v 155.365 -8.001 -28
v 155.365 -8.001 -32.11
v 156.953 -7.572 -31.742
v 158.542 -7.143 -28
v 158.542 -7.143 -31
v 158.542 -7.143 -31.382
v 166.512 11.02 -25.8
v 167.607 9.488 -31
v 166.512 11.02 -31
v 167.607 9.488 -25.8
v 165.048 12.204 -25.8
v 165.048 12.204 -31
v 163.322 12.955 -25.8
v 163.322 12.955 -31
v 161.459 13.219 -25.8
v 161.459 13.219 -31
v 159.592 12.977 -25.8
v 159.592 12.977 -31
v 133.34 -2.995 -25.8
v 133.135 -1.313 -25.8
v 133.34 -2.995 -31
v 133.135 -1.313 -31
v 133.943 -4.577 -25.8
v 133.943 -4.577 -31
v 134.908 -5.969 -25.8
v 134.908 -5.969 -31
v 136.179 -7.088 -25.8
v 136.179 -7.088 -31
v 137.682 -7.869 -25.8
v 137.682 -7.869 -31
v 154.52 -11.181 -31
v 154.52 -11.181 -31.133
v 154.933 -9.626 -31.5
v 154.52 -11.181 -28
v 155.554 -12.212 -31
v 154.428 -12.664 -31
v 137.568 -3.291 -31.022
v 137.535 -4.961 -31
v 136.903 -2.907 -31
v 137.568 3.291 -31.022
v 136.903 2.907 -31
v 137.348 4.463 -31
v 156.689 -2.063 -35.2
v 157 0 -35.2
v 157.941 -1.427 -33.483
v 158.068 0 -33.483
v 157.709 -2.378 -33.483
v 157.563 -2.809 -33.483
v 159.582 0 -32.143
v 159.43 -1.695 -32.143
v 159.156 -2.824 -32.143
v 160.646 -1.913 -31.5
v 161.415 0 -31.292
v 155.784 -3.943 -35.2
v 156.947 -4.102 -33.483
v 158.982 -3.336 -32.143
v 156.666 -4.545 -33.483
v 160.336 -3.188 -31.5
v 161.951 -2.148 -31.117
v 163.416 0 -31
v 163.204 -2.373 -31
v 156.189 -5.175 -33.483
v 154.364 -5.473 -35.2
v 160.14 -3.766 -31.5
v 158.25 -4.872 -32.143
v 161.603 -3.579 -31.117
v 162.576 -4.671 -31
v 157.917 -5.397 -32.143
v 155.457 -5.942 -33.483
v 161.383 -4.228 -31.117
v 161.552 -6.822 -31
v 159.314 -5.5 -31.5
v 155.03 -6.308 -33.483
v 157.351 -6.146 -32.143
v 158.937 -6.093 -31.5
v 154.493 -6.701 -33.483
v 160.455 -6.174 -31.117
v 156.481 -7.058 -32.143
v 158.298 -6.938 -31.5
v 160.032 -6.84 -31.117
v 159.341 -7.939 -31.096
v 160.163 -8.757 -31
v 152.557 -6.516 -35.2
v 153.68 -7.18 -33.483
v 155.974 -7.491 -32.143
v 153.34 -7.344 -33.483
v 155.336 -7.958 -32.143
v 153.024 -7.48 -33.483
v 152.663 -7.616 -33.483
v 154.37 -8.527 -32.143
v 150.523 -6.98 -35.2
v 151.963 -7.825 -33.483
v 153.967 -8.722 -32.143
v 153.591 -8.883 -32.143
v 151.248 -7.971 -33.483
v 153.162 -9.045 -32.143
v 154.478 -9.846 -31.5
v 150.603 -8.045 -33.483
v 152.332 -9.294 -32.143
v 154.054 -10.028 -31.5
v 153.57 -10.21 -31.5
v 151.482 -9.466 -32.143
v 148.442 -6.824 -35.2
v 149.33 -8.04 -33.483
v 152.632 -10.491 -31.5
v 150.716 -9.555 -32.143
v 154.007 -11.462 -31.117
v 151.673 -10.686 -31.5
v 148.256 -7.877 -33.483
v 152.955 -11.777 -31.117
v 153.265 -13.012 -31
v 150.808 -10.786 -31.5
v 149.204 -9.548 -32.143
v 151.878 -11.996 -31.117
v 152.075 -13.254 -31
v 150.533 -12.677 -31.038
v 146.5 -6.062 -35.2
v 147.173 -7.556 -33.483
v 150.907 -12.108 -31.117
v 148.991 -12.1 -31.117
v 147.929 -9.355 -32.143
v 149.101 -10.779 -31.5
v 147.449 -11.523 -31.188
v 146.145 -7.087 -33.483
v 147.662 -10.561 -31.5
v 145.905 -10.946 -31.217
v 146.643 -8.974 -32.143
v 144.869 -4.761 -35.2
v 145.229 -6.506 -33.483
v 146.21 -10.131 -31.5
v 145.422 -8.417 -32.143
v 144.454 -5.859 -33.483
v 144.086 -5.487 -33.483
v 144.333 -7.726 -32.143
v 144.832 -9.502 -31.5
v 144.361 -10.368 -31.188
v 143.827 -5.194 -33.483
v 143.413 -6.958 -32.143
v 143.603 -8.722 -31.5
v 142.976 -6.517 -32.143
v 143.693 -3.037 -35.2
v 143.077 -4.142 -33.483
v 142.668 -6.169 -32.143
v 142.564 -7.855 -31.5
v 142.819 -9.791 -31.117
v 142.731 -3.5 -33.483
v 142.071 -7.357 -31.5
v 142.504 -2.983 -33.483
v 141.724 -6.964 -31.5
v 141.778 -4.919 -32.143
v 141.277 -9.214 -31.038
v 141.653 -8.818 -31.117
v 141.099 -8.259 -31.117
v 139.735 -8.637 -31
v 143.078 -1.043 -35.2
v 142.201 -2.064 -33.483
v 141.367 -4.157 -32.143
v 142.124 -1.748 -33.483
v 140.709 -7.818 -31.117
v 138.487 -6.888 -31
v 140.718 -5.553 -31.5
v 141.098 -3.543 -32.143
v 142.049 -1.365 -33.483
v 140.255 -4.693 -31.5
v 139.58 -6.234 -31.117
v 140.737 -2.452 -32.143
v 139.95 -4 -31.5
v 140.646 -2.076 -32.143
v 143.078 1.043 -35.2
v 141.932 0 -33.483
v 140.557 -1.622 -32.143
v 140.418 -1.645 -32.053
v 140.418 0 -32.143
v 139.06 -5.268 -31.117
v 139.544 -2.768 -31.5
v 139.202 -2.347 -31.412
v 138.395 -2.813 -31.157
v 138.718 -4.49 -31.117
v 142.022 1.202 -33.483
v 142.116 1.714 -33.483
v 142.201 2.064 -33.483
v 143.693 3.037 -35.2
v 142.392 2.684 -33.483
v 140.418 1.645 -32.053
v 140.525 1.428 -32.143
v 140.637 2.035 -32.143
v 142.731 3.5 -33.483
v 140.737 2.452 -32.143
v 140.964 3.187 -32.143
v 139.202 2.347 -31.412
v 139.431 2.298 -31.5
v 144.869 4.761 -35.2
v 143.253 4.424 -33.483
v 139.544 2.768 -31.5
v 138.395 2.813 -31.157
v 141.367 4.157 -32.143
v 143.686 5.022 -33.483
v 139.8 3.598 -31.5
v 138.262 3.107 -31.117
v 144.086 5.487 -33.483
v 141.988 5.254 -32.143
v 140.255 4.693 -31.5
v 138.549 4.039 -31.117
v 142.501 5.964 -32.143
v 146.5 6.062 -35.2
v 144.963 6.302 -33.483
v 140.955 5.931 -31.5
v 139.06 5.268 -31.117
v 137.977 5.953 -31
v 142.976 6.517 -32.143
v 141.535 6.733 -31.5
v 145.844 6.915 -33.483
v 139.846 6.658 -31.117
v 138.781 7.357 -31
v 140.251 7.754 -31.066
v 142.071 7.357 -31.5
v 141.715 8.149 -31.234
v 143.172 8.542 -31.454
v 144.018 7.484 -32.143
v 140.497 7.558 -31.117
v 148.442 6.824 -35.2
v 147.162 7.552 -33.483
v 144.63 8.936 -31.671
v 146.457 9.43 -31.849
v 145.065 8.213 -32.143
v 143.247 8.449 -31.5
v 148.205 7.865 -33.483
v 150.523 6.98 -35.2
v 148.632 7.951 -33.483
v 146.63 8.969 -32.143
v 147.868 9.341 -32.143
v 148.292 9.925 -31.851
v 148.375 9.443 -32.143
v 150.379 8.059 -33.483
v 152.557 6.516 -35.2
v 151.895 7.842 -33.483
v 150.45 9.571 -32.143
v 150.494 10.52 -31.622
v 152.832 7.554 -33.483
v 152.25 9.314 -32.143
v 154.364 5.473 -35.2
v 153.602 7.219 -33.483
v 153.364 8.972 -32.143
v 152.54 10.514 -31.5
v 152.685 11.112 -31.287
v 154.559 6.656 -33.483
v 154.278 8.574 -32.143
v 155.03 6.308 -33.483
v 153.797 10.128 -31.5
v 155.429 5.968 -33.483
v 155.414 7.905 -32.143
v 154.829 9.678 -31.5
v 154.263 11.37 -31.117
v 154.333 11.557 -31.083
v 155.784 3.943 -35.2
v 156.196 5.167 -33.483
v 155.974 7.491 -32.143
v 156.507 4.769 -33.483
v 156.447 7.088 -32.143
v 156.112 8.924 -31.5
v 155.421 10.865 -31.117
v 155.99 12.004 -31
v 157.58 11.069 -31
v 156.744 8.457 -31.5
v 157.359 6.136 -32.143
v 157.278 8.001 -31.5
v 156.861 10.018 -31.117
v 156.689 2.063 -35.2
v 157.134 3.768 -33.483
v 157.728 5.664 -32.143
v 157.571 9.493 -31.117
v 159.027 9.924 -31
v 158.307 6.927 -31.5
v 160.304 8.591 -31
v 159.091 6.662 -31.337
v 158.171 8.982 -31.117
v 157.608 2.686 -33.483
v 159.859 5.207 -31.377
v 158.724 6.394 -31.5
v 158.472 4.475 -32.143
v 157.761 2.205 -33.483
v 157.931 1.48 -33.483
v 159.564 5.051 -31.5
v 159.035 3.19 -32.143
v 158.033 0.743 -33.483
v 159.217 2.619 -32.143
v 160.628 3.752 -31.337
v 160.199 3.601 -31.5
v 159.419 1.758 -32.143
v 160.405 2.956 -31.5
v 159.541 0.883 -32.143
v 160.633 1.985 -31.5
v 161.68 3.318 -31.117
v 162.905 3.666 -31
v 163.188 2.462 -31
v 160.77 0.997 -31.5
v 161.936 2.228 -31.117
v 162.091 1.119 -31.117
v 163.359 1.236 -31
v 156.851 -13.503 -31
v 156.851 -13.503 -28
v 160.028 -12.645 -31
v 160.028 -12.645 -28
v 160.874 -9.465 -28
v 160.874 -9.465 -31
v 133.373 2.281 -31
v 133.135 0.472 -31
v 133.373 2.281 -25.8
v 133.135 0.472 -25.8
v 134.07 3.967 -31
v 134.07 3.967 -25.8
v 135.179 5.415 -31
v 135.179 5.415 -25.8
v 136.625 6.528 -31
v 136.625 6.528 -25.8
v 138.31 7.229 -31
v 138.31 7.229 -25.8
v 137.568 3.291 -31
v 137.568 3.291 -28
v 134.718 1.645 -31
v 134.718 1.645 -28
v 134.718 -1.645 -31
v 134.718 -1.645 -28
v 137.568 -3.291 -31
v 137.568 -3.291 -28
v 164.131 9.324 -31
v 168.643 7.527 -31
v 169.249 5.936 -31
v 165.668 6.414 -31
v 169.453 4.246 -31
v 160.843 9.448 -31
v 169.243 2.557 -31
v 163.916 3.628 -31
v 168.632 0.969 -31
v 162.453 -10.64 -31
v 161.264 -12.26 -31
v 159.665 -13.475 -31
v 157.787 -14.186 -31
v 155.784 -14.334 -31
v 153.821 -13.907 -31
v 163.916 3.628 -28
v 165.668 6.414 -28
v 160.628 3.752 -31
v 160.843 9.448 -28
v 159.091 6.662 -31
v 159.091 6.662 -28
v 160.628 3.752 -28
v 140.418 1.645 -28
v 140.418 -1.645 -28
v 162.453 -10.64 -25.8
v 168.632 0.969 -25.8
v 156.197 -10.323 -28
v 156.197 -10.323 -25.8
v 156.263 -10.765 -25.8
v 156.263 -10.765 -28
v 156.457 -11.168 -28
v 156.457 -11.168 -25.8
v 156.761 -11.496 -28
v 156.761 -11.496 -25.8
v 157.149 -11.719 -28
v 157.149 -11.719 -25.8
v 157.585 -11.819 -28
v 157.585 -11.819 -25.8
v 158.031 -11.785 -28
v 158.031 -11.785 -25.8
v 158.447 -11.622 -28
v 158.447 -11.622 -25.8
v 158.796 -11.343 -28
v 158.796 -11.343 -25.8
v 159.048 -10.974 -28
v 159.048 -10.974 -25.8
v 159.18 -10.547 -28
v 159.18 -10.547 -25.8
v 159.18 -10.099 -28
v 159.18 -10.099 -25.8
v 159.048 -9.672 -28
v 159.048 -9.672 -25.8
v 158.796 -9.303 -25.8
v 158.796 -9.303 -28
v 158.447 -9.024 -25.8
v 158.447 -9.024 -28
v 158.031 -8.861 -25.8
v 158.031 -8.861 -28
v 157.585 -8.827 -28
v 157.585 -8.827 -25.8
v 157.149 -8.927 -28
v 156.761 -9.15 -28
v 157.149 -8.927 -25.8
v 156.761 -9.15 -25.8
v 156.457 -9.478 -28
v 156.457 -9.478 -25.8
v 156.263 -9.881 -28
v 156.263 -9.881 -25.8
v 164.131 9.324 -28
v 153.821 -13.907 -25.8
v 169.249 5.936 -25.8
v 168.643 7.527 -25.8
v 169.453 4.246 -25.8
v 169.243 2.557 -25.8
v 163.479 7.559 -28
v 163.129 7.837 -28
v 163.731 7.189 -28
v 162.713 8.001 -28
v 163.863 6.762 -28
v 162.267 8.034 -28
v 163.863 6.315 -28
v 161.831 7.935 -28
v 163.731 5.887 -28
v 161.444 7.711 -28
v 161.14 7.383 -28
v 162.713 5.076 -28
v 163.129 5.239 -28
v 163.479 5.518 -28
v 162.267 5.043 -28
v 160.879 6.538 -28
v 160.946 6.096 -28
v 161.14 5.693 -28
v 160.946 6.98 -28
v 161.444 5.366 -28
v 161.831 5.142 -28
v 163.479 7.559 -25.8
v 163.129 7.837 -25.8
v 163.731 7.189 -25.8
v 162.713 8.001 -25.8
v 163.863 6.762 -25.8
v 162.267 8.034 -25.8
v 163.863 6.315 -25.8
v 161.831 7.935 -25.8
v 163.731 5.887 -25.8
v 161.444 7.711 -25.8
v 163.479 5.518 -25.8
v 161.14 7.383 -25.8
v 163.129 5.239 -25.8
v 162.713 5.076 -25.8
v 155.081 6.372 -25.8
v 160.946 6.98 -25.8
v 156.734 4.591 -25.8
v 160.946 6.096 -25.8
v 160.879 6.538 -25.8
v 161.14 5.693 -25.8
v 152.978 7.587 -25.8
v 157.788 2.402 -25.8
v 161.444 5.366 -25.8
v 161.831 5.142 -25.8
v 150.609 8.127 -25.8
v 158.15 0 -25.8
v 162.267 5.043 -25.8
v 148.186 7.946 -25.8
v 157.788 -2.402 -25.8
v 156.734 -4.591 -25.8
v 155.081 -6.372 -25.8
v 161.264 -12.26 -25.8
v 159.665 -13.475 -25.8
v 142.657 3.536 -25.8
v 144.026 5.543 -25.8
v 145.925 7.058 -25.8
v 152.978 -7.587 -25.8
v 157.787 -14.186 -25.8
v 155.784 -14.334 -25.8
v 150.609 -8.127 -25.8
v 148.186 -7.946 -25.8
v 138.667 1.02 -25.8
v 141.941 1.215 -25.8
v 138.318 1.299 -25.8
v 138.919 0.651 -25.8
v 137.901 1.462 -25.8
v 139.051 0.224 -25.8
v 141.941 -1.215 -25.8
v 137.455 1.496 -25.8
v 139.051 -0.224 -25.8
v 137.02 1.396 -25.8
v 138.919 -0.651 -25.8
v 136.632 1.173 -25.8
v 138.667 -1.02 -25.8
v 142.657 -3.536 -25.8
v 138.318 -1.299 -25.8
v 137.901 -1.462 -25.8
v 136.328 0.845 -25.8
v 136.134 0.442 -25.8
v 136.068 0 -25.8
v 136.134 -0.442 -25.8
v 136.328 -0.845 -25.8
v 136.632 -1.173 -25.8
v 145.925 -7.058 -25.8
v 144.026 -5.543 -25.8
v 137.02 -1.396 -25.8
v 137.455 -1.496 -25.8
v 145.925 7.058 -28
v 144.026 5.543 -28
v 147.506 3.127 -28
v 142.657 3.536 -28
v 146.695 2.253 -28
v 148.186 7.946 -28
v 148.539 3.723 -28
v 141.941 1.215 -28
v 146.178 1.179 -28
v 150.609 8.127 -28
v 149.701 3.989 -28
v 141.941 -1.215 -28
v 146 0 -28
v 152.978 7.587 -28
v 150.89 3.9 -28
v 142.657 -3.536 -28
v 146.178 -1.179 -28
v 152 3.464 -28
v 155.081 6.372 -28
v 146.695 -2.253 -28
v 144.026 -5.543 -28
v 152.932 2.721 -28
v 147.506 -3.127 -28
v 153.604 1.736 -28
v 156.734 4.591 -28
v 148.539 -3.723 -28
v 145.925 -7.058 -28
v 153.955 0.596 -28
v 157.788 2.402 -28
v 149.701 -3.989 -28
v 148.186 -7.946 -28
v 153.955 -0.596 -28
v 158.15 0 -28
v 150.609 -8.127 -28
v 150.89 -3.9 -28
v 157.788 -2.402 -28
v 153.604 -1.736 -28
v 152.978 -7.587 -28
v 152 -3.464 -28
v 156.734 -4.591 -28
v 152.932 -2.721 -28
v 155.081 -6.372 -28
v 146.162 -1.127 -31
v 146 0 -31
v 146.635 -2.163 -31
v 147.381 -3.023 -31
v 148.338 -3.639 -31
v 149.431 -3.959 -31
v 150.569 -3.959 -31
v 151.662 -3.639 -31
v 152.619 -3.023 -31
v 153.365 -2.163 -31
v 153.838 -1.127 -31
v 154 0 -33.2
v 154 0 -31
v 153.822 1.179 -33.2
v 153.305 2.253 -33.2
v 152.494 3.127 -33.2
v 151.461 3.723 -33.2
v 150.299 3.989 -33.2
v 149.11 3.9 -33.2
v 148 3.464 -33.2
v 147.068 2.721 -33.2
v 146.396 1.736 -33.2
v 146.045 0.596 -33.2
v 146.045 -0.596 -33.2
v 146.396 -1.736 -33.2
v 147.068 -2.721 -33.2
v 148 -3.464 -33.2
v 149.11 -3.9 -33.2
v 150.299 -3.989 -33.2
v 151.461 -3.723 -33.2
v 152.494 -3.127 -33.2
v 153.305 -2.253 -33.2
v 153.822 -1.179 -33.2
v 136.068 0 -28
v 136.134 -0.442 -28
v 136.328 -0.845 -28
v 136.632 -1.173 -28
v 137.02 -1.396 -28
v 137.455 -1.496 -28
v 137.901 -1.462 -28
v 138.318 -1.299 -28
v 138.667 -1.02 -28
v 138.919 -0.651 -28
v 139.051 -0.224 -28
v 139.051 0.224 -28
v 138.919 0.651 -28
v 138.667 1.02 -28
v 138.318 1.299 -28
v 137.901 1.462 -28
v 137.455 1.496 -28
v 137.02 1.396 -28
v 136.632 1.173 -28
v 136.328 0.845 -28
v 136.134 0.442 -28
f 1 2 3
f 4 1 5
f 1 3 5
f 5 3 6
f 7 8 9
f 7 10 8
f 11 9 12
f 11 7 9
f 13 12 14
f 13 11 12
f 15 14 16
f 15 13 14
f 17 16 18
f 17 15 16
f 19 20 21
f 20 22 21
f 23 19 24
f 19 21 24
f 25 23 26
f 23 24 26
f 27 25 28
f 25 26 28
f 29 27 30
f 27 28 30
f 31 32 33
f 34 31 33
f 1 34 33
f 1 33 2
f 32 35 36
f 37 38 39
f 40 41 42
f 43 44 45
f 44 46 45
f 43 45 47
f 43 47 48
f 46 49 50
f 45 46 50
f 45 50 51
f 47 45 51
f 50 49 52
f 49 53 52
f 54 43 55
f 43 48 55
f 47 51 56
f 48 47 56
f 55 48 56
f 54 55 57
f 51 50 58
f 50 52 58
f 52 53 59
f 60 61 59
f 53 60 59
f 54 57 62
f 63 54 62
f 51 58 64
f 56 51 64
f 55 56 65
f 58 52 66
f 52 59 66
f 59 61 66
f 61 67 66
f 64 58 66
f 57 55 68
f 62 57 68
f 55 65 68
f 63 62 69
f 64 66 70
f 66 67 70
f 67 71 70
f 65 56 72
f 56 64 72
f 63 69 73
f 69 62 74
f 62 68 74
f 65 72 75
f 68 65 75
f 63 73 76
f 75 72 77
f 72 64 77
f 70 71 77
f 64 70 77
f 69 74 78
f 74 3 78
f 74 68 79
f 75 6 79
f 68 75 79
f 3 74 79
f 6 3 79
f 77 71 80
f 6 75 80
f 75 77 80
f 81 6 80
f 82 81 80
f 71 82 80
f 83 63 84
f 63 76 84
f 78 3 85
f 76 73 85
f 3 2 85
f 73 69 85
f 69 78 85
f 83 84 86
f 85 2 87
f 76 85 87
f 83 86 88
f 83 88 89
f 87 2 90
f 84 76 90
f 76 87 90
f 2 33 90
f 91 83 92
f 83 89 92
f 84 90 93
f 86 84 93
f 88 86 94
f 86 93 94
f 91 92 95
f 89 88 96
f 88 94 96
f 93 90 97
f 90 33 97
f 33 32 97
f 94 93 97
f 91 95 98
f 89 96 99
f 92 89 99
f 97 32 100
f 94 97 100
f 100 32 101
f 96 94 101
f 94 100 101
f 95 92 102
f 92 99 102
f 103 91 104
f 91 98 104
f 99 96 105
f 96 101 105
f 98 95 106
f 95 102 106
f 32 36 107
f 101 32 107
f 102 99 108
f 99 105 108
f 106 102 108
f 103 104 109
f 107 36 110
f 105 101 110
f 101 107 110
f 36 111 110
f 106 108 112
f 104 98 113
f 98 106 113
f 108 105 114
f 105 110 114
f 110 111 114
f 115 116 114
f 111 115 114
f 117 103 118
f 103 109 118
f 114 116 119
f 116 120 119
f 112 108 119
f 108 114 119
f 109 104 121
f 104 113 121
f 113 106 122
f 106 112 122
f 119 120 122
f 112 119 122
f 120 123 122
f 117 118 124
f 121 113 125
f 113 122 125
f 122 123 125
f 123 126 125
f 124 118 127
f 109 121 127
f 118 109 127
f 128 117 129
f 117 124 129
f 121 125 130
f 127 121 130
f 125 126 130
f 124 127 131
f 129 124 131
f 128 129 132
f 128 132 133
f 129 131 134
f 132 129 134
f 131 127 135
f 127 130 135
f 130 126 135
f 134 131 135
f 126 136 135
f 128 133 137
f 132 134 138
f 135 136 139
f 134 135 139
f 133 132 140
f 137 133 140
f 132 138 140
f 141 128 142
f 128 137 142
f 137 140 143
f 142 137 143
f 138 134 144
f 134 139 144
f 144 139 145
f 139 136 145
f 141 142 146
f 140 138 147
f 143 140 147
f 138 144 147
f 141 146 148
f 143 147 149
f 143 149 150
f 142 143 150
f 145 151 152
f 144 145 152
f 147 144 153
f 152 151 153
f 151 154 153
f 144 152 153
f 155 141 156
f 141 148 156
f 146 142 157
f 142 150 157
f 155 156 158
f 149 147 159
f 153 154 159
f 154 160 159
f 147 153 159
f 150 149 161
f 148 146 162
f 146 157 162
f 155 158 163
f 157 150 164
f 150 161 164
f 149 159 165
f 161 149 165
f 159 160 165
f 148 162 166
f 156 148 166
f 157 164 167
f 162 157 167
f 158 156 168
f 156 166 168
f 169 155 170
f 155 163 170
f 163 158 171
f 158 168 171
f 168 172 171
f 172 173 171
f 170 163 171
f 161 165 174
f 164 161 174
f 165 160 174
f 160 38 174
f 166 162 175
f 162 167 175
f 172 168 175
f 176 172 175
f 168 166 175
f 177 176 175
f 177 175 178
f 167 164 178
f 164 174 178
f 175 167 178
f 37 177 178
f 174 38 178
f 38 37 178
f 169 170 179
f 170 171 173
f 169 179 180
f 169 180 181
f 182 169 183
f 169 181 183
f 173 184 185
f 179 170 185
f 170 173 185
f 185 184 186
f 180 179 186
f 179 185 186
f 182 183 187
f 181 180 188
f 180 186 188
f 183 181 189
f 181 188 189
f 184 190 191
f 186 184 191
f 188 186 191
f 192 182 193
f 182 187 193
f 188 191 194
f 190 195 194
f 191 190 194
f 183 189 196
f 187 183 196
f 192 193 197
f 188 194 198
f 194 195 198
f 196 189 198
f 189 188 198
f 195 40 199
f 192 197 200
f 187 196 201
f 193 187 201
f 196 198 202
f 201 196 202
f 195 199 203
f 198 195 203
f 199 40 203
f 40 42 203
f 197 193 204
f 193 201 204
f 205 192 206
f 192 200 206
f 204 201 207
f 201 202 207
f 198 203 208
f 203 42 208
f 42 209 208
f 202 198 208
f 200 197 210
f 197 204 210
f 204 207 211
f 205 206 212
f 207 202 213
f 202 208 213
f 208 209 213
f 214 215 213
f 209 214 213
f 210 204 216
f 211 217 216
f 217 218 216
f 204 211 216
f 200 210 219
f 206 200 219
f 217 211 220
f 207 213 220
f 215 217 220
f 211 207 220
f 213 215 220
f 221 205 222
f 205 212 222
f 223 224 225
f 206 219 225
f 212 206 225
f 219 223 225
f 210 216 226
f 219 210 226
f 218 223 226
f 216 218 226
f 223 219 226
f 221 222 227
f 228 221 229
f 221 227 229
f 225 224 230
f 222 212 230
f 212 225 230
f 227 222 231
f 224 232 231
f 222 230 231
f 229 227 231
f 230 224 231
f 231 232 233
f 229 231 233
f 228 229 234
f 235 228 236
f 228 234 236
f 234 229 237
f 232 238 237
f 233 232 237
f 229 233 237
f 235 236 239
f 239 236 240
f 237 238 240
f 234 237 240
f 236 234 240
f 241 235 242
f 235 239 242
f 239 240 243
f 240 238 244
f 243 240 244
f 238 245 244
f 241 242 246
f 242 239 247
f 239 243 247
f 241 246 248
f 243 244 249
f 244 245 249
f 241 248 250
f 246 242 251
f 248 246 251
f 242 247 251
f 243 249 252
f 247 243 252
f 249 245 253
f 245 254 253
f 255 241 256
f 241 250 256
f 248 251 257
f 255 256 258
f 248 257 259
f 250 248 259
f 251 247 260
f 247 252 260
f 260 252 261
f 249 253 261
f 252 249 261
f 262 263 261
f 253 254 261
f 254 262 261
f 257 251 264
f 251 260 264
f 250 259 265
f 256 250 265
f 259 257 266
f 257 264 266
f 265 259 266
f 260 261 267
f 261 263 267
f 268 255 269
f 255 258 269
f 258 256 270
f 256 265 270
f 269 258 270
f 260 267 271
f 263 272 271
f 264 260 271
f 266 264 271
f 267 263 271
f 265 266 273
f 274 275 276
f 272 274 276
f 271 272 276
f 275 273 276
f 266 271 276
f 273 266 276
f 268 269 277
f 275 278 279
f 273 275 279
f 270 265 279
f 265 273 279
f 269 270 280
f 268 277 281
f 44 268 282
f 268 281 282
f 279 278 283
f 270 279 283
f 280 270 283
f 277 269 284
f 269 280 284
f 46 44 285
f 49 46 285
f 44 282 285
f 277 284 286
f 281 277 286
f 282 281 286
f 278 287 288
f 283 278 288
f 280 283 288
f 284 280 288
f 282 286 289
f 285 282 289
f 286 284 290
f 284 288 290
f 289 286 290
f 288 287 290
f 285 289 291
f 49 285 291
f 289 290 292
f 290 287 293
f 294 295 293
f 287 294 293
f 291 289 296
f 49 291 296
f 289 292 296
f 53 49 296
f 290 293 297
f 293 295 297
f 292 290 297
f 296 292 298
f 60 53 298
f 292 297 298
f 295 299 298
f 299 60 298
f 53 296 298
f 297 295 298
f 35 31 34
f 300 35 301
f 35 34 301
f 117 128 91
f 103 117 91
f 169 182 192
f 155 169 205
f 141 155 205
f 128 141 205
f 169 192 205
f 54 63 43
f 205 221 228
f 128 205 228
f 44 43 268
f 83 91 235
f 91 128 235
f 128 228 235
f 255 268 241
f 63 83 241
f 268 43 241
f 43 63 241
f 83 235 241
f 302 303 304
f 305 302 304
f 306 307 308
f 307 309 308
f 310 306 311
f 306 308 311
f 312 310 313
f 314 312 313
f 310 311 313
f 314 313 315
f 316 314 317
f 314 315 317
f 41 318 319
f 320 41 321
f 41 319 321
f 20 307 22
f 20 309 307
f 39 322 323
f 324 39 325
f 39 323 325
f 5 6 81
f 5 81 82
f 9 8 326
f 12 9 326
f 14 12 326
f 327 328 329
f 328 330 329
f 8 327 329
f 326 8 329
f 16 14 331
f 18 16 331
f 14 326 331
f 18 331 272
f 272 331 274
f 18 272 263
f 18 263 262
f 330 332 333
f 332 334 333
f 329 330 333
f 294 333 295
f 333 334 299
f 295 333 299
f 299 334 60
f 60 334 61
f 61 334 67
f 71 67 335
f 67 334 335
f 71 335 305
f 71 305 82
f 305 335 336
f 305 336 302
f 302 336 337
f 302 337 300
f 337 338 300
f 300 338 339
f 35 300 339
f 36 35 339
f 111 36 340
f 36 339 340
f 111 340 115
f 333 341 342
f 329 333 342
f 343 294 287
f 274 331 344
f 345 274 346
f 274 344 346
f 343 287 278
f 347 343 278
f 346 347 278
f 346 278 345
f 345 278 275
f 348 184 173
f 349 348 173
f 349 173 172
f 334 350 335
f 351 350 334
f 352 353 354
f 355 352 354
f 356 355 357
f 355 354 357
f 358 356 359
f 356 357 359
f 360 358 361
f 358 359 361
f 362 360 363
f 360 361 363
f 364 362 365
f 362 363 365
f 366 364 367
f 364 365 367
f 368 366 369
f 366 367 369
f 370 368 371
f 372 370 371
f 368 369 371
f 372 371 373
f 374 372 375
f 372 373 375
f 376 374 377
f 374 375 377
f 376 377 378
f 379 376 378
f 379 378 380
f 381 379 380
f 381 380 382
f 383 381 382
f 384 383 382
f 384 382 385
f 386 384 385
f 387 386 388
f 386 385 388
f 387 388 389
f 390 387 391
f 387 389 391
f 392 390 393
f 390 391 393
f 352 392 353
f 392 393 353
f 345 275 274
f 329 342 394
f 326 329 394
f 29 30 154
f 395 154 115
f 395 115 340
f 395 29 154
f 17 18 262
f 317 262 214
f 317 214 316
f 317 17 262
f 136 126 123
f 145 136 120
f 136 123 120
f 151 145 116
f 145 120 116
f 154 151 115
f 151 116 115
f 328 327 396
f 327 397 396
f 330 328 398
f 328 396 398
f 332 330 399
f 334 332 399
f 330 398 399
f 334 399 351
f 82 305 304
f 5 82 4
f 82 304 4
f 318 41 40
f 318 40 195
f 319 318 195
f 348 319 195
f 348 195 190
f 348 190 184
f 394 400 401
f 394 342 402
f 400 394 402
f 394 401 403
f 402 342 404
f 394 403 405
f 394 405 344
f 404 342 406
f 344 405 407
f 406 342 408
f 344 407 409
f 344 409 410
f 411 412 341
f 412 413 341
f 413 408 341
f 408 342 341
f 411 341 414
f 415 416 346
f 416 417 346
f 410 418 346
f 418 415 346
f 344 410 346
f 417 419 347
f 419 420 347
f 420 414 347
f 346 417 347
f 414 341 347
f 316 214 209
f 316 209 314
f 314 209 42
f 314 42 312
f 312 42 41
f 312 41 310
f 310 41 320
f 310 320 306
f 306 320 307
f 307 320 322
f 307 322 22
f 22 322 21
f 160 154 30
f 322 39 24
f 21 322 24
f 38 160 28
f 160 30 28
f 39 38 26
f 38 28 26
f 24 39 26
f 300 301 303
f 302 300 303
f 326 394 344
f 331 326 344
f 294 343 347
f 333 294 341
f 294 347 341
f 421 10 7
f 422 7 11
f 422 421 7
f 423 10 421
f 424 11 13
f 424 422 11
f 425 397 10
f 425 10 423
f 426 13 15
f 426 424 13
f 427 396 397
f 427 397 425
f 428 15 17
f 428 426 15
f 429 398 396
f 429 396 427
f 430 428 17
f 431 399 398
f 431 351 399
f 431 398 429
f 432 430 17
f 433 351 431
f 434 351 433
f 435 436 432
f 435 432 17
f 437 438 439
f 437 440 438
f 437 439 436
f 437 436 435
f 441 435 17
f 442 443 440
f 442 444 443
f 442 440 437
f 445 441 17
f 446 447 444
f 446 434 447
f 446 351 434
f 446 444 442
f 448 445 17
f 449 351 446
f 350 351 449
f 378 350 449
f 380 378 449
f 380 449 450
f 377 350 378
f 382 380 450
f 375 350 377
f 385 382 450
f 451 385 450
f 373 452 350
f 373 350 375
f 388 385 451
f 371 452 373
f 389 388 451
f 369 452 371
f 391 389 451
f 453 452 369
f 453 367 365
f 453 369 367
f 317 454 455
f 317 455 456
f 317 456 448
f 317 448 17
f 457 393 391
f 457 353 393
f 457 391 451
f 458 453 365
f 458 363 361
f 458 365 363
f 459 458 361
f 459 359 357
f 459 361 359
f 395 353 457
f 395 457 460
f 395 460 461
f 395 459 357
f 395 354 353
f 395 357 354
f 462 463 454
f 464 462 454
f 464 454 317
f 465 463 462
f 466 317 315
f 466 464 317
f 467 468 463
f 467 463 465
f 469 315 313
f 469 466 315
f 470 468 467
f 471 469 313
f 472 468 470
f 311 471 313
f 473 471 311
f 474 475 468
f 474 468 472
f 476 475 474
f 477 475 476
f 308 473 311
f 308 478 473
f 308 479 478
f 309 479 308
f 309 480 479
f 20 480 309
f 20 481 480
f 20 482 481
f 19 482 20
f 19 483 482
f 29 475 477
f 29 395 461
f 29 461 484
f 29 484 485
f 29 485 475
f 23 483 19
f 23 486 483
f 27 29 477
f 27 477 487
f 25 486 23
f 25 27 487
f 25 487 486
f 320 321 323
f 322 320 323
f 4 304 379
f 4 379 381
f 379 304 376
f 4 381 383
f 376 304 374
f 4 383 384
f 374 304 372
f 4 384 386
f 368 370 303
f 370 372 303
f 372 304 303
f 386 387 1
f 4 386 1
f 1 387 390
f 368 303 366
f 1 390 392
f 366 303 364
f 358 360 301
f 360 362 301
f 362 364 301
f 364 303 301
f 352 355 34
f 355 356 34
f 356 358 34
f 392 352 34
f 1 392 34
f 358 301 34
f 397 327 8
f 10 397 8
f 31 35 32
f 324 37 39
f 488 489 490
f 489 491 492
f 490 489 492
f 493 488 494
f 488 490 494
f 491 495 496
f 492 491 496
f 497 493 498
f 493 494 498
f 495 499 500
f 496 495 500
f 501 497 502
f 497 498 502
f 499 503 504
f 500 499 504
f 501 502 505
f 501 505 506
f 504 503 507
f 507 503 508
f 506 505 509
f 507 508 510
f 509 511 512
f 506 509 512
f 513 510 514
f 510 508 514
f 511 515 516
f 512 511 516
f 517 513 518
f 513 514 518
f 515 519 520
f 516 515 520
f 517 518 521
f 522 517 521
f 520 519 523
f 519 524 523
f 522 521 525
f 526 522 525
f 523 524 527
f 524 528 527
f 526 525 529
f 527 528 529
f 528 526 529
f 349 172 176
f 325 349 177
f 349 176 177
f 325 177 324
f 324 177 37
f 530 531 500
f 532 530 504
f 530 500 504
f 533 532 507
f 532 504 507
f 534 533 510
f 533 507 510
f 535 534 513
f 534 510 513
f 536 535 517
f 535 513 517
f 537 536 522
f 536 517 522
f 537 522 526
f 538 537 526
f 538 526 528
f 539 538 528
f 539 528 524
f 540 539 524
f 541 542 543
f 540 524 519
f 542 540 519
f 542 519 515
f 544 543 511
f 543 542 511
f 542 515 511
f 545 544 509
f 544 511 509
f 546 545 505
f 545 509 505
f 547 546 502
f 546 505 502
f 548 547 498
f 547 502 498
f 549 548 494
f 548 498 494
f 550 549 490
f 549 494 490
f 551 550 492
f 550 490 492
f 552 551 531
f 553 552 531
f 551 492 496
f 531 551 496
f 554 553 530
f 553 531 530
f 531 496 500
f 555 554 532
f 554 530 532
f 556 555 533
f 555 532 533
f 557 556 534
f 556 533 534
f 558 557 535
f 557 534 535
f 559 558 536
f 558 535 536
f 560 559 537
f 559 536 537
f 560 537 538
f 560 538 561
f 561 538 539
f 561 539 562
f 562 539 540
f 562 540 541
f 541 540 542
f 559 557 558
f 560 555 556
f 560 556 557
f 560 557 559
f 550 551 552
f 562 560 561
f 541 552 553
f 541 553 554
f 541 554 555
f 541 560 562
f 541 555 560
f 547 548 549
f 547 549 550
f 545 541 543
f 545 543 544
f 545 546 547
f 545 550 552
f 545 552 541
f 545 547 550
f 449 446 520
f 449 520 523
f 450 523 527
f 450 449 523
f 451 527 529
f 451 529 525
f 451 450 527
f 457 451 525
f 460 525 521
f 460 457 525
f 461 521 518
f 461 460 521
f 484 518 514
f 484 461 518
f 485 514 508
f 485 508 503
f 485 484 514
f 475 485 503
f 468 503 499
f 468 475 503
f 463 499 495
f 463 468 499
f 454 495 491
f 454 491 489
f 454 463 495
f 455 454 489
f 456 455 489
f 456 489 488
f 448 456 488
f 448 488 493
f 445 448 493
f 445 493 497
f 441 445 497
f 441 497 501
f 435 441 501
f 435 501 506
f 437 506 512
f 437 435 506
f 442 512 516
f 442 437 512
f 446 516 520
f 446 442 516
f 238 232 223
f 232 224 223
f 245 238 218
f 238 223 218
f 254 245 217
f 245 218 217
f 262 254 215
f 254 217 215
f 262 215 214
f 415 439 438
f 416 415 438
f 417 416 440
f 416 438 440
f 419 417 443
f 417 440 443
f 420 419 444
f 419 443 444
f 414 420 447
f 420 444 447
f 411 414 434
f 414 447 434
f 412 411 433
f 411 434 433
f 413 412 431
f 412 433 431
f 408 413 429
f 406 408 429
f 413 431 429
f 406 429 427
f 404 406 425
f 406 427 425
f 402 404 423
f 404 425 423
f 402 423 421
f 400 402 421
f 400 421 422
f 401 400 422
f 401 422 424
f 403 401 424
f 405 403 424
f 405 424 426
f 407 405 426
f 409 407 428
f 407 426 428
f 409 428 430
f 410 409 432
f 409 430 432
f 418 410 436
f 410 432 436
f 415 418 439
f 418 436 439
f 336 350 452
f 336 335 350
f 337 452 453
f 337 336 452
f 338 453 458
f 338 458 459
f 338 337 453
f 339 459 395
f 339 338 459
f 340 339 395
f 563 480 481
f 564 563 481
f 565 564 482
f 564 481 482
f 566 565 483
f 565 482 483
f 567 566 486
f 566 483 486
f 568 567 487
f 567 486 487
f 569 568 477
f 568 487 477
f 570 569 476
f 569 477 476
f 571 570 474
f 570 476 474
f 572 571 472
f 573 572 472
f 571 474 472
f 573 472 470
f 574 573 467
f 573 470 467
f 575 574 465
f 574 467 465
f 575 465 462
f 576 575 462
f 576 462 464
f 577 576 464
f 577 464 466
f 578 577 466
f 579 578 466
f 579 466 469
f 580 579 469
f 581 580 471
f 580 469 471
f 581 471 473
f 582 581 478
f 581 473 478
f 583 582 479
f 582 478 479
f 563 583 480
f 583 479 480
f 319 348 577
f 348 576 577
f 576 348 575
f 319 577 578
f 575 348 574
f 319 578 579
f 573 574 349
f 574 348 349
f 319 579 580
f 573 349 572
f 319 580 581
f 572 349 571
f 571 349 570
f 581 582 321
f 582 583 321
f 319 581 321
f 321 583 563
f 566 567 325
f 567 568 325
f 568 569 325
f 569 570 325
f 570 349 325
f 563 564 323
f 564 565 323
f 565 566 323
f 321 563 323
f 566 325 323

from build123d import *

# Parameters (mm, degrees)
SKETCH1_R           = 8
SKETCH1_R_2         = 1.5
BOSS_EXTRUDE1_DEPTH = 2.2
BOSS_EXTRUDE2_START = 2.2
SKETCH1_3_R         = 8
SKETCH1_3_R_2       = 4
BOSS_EXTRUDE2_DEPTH = 3
FILLET1_R           = 7
CUT_EXTRUDE2_START  = -5.2
SKETCH2_R           = 8.05
SKETCH2_R_2         = 7
CUT_EXTRUDE2_DEPTH  = 2.2
SKETCH2_4_R         = 7
SKETCH2_4_R_2       = 4
BOSS_EXTRUDE3_DEPTH = 2.2
BOSS_EXTRUDE4_START = 2.2
SKETCH2_5_R         = 7
SKETCH2_5_R_2       = 4
BOSS_EXTRUDE4_DEPTH = 2
FILLET2_START       = -35.2
FILLET2_2_DEPTH     = 4.2
SKETCH3_R           = 8.15
SKETCH3_R_2         = 8.05
CUT_EXTRUDE3_DEPTH  = 2.2


with BuildPart() as part:
    # Sketch1 → Boss-Extrude1 (new body)
    # profile 1 of 4: a face of its own
    with BuildSketch(Plane(origin=(0, 0, -25.8), x_dir=(-1, 0, 0), z_dir=(0, 0, -1))):
        Polygon((-133.135100578, -5.831793049), (-133.135100578, 6.168206951), (-159.569076944, 16.05794409), (-170.376148703, -4.244942404), (-164.993668486, -14.43595779), align=None)
        with Locations((-150, 0)):
            Circle(SKETCH1_R, mode=Mode.SUBTRACT)
        Polygon((-165.667996862, -6.414349097), (-164.131074119, -9.324309317), (-160.842513273, -9.448275288), (-159.09087517, -6.662281039), (-160.627797913, -3.752320819), (-163.916358759, -3.628354848), align=None, mode=Mode.SUBTRACT)
        Polygon((-140.417550289, 1.645448267), (-140.417550289, -1.645448267), (-137.567550289, -3.290896534), (-134.717550289, -1.645448267), (-134.717550289, 1.645448267), (-137.567550289, 3.290896534), align=None, mode=Mode.SUBTRACT)
        Polygon((-160.873796009, 9.464930151), (-158.542174952, 7.142529831), (-155.365106749, 8.000572737), (-154.519659602, 11.181015965), (-156.851280658, 13.503416285), (-160.028348862, 12.645373378), align=None, mode=Mode.SUBTRACT)
    # profile 2 of 4: a face of its own
    with BuildSketch(Plane(origin=(0, 0, -25.8), x_dir=(-1, 0, 0), z_dir=(0, 0, -1))):
        Polygon((-163.916358759, -3.628354848), (-165.667996862, -6.414349097), (-164.131074119, -9.324309317), (-160.842513273, -9.448275288), (-159.09087517, -6.662281039), (-160.627797913, -3.752320819), align=None)
        with Locations((-162.379436016, -6.538315068)):
            Circle(SKETCH1_R_2, mode=Mode.SUBTRACT)
    # profile 3 of 4: a face of its own
    with BuildSketch(Plane(origin=(0, 0, -25.8), x_dir=(-1, 0, 0), z_dir=(0, 0, -1))):
        Polygon((-160.028348862, 12.645373378), (-160.873796009, 9.464930151), (-158.542174952, 7.142529831), (-155.365106749, 8.000572737), (-154.519659602, 11.181015965), (-156.851280658, 13.503416285), align=None)
        with Locations((-157.696727805, 10.322973058)):
            Circle(SKETCH1_R_2, mode=Mode.SUBTRACT)
    # profile 4 of 4: a face of its own
    with BuildSketch(Plane(origin=(0, 0, -25.8), x_dir=(-1, 0, 0), z_dir=(0, 0, -1))):
        Polygon((-137.567550289, 3.290896534), (-140.417550289, 1.645448267), (-140.417550289, -1.645448267), (-137.567550289, -3.290896534), (-134.717550289, -1.645448267), (-134.717550289, 1.645448267), align=None)
        with Locations((-137.567550289, 0)):
            Circle(SKETCH1_R_2, mode=Mode.SUBTRACT)
    extrude(amount=BOSS_EXTRUDE1_DEPTH)

    # Sketch1<3> → Boss-Extrude2 (add)
    # profile 1 of 2: a face of its own
    with BuildSketch(Plane(origin=(0, 0, -25.8), x_dir=(-1, 0, 0), z_dir=(0, 0, -1)).offset(BOSS_EXTRUDE2_START)):
        Polygon((-133.135100578, -5.831793049), (-133.135100578, 6.168206951), (-159.569076944, 16.05794409), (-170.376148703, -4.244942404), (-164.993668486, -14.43595779), align=None)
        with Locations((-150, 0)):
            Circle(SKETCH1_3_R, mode=Mode.SUBTRACT)
        Polygon((-165.667996862, -6.414349097), (-164.131074119, -9.324309317), (-160.842513273, -9.448275288), (-159.09087517, -6.662281039), (-160.627797913, -3.752320819), (-163.916358759, -3.628354848), align=None, mode=Mode.SUBTRACT)
        Polygon((-140.417550289, 1.645448267), (-140.417550289, -1.645448267), (-137.567550289, -3.290896534), (-134.717550289, -1.645448267), (-134.717550289, 1.645448267), (-137.567550289, 3.290896534), align=None, mode=Mode.SUBTRACT)
        Polygon((-160.873796009, 9.464930151), (-158.542174952, 7.142529831), (-155.365106749, 8.000572737), (-154.519659602, 11.181015965), (-156.851280658, 13.503416285), (-160.028348862, 12.645373378), align=None, mode=Mode.SUBTRACT)
    # profile 2 of 2: a face of its own
    with BuildSketch(Plane(origin=(0, 0, -25.8), x_dir=(-1, 0, 0), z_dir=(0, 0, -1)).offset(BOSS_EXTRUDE2_START)):
        with Locations((-150, 0)):
            Circle(SKETCH1_3_R)
        with Locations((-150, 0)):
            Circle(SKETCH1_3_R_2, mode=Mode.SUBTRACT)
    extrude(amount=BOSS_EXTRUDE2_DEPTH)

    # Fillet1
    fillet1_edges = [part.edges().sort_by_distance(p)[0] for p in [
        (133.135100578, -5.831793049, -28.4),
        (164.993668486, -14.43595779, -28.4),
        (170.376148703, -4.244942404, -28.4),
        (159.569076944, 16.05794409, -28.4),
        (133.135100578, 6.168206951, -28.4),
    ]]
    fillet(fillet1_edges, radius=FILLET1_R)

    # Sketch2 → Cut-Extrude2 (cut)
    with BuildSketch(Plane(origin=(0, 0, -31), x_dir=(-1, 0, 0), z_dir=(0, 0, -1)).offset(CUT_EXTRUDE2_START)):
        with Locations(Location((-150, 0, 0), (0, 0, 180))):
            Circle(SKETCH2_R)
        with Locations((-150, 0)):
            Circle(SKETCH2_R_2, mode=Mode.SUBTRACT)
    extrude(amount=CUT_EXTRUDE2_DEPTH, mode=Mode.SUBTRACT)

    # Sketch2<4> → Boss-Extrude3 (add)
    with BuildSketch(Plane(origin=(0, 0, -31), x_dir=(-1, 0, 0), z_dir=(0, 0, -1))):
        with Locations(Location((-150, 0, 0), (0, 0, 180))):
            Circle(SKETCH2_4_R)
        with Locations(Location((-150, 0, 0), (0, 0, 180))):
            Circle(SKETCH2_4_R_2, mode=Mode.SUBTRACT)
    extrude(amount=BOSS_EXTRUDE3_DEPTH)

    # Sketch2<5> → Boss-Extrude4 (add)
    # profile 1 of 2: a face of its own
    with BuildSketch(Plane(origin=(0, 0, -31), x_dir=(-1, 0, 0), z_dir=(0, 0, -1)).offset(BOSS_EXTRUDE4_START)):
        with Locations(Location((-150, 0, 0), (0, 0, 180))):
            Circle(SKETCH2_5_R)
        with Locations(Location((-150, 0, 0), (0, 0, 180))):
            Circle(SKETCH2_5_R_2, mode=Mode.SUBTRACT)
    # profile 2 of 2: a face of its own
    with BuildSketch(Plane(origin=(0, 0, -31), x_dir=(-1, 0, 0), z_dir=(0, 0, -1)).offset(BOSS_EXTRUDE4_START)):
        with Locations(Location((-150, 0, 0), (0, 0, 180))):
            Circle(SKETCH2_5_R_2)
    extrude(amount=BOSS_EXTRUDE4_DEPTH)

    # Fillet2: read off the stored shape, not the designer's step
    # Fillet2 outline → Fillet2 (revolve)
    with BuildSketch(Plane(origin=(150, 0, 0), x_dir=(1, 0, 0), z_dir=(0, -1, 0))):
        with BuildLine():
            ThreePointArc((7, -35.2), (9.58154807, -32.143379814), (13.415605973, -31))
            Line((13.415605973, -31), (7, -31))
            Line((7, -31), (7, -35.2))
        make_face()
    revolve(axis=Axis((150, 0, 0), (0, 0, 1)))

    # Fillet2 2 outline → Fillet2 2 (cut)
    with BuildSketch(Plane.XY.offset(FILLET2_START)):
        with BuildLine():
            Line((140.417550289, 1.645448267), (137.567550289, 3.290896534))
            Line((137.567550289, 3.290896534), (136.903212084, 2.907340693))
            ThreePointArc((136.903212084, 2.907340693), (136.584394027, 0), (136.903212084, -2.907340693))
            Line((136.903212084, -2.907340693), (137.567550289, -3.290896534))
            Line((137.567550289, -3.290896534), (140.417550289, -1.645448267))
            Line((140.417550289, -1.645448267), (140.417550289, 1.645448267))
        make_face()
        with BuildLine():
            Line((159.09087517, -6.662281039), (160.303741962, -8.59135526))
            ThreePointArc((160.303741962, -8.59135526), (161.862688268, -6.265389906), (162.904858589, -3.666484475))
            Line((162.904858589, -3.666484475), (160.627797913, -3.752320819))
            Line((160.627797913, -3.752320819), (159.09087517, -6.662281039))
        make_face()
        with BuildLine():
            Line((155.989734556, -12.004231069), (138.781383409, -7.356706152))
            ThreePointArc((138.781383409, -7.356706152), (146.50211867, -12.951575573), (155.989734556, -12.004231069))
        make_face()
        with BuildLine():
            ThreePointArc((152.074956497, 13.254170633), (145.29905415, 12.565014594), (139.734777095, 8.637342318))
            Line((139.734777095, 8.637342318), (152.074956497, 13.254170633))
        make_face()
        with BuildLine():
            Line((155.365106749, 8.000572737), (158.542174952, 7.142529831))
            Line((158.542174952, 7.142529831), (160.163207231, 8.7571515))
            ThreePointArc((160.163207231, 8.7571515), (158.046418581, 10.7346929), (155.554467123, 12.211731188))
            Line((155.554467123, 12.211731188), (154.519659602, 11.181015965))
            Line((154.519659602, 11.181015965), (155.365106749, 8.000572737))
        make_face()
    extrude(amount=FILLET2_2_DEPTH, mode=Mode.SUBTRACT)

    # Sketch3 → Cut-Extrude3 (cut)
    with BuildSketch(Plane.XY.offset(-25.8)):
        with Locations((150, 0)):
            Circle(SKETCH3_R)
        with Locations((150, 0)):
            Circle(SKETCH3_R_2, mode=Mode.SUBTRACT)
    extrude(amount=-CUT_EXTRUDE3_DEPTH, mode=Mode.SUBTRACT)


with BuildPart() as body_2:
    # Mirror3: mirrored copy
    add(part.part.mirror(Plane.ZX))


solid = body_2.part
